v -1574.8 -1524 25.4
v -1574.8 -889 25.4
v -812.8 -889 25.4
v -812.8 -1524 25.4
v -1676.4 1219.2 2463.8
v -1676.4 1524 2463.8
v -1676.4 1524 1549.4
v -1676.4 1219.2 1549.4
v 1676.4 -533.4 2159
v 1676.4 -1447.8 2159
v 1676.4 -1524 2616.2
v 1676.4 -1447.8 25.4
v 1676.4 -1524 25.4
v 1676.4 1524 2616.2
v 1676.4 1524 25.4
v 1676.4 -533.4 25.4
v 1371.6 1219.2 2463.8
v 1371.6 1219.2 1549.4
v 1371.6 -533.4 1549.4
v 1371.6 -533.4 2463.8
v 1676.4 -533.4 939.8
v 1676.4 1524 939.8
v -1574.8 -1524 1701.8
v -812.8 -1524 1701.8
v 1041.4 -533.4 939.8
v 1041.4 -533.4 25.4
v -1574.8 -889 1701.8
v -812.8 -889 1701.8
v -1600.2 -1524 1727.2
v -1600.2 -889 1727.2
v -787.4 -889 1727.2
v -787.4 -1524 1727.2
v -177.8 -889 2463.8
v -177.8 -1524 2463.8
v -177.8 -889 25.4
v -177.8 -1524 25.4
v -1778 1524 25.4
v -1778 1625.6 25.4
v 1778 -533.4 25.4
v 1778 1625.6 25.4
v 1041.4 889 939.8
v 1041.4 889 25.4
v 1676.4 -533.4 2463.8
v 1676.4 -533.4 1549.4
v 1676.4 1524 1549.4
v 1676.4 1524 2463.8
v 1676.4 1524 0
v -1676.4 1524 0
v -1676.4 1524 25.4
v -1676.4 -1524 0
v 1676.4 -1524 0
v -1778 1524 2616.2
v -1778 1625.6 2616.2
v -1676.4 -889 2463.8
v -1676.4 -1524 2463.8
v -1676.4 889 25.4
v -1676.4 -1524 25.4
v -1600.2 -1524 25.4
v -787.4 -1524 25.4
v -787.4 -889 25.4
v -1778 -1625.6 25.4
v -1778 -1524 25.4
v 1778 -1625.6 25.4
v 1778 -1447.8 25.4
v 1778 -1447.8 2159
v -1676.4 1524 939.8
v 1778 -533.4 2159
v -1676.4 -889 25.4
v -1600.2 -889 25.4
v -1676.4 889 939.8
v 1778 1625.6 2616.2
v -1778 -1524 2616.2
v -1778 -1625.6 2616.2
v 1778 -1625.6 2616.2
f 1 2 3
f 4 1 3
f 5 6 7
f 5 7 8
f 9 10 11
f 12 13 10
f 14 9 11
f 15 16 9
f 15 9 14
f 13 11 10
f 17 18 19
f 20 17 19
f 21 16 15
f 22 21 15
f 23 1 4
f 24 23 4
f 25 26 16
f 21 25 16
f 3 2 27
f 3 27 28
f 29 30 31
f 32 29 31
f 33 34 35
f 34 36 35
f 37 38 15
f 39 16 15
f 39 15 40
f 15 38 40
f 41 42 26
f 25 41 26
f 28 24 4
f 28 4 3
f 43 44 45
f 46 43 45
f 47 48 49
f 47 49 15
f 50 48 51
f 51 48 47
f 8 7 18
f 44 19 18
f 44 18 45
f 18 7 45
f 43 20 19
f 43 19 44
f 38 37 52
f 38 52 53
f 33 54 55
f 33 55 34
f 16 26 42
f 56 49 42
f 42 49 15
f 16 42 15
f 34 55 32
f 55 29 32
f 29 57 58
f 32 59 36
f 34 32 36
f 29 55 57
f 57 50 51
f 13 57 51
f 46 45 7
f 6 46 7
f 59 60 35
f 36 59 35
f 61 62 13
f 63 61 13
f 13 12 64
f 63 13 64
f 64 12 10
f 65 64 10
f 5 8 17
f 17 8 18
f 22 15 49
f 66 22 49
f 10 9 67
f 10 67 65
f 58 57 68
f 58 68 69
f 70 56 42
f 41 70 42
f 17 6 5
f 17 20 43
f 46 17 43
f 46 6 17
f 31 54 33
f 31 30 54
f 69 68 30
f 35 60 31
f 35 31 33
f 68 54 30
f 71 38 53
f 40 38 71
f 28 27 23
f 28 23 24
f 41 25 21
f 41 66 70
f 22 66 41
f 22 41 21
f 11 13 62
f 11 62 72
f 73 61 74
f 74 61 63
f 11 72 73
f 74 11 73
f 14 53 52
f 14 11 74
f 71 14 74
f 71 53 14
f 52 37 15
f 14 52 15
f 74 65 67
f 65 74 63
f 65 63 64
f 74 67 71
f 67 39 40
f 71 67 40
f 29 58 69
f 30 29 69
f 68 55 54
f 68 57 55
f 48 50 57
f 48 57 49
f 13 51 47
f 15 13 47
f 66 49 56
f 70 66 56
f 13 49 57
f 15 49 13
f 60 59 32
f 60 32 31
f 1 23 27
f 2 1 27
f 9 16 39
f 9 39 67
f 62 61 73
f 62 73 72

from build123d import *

# Parameters (mm, degrees)
F0_W      = 3352.8
F0_H      = 3048
F1_DEPTH  = 25.4
F2_W      = 3556
F2_H      = 3251.2
F2_W_2    = 3352.8
F2_H_2    = 3048
F3_DEPTH  = 2590.8
F4_W      = 914.4
F4_H      = 2133.6
F5_DEPTH  = 101.6
F6_W      = 3048
F6_H      = 2590.8
F7_DEPTH  = 101.6
F9_DEPTH  = 914.4
F12_DEPTH = 914.4
F13_W     = 762
F13_H     = 635
F14_DEPTH = 1676.4
F15_W     = 609.6
F15_H     = 635
F16_DEPTH = 1701.8
F15_W_2   = 76.2
F17_W     = 1498.6
F17_H     = 635
F18_DEPTH = 736.6


with BuildPart() as f1:
    # F0 (on Top) → F1 (new body)
    with BuildSketch(Plane.XY):
        Rectangle(F0_W, F0_H)
    extrude(amount=F1_DEPTH)


with BuildPart() as f3:
    # F2 (on face) → F3 (new body)
    with BuildSketch(Plane.XY.offset(25.4)):
        Rectangle(F2_W, F2_H)
        Rectangle(F2_W_2, F2_H_2, mode=Mode.SUBTRACT)
    extrude(amount=F3_DEPTH)

    # F4 (on face) → F5 (cut, through all)
    with BuildSketch(Plane(origin=(1676.4, 0, 0), x_dir=(0, -1, 0), z_dir=(-1, 0, 0))):
        with Locations((990.6, 1092.2)):
            Rectangle(F4_W, F4_H)
    extrude(amount=-F5_DEPTH, mode=Mode.SUBTRACT)

    # F6 (on face) → F7 (cut, through all)
    with BuildSketch(Plane.YZ.offset(-1676.4)):
        with Locations((0, 1320.8)):
            Rectangle(F6_W, F6_H)
    extrude(amount=-F7_DEPTH, mode=Mode.SUBTRACT)


with BuildPart() as f9:
    # F8 (on face) → F9 (new body)
    with BuildSketch(Plane.XY.offset(25.4)):
        Polygon((1041.4, -533.4), (1676.4, -533.4), (1676.4, 1524), (-1676.4, 1524), (-1676.4, 889), (1041.4, 889), align=None)
    extrude(amount=F9_DEPTH)


with BuildPart() as f12:
    # F11 (on offset) → F12 (new body)
    with BuildSketch(Plane.XY.offset(1549.4)):
        Polygon((1676.4, 1524), (-1676.4, 1524), (-1676.4, 1219.2), (1371.6, 1219.2), (1371.6, -533.4), (1676.4, -533.4), align=None)
    extrude(amount=F12_DEPTH)


with BuildPart() as f14:
    # F13 (on face) → F14 (new body)
    with BuildSketch(Plane.XY.offset(25.4)):
        with Locations((-1193.8, -1206.5)):
            Rectangle(F13_W, F13_H)
    extrude(amount=F14_DEPTH)


with BuildPart() as f16:
    # F15 (on face) → F16 (new body)
    with BuildSketch(Plane.XY.offset(25.4)):
        with Locations((-482.6, -1206.5)):
            Rectangle(F15_W, F15_H)
    extrude(amount=F16_DEPTH)



with BuildPart() as f16b:
    # F15 (on face) → F16, piece 2 (new body)
    with BuildSketch(Plane.XY.offset(25.4)):
        with Locations((-1638.3, -1206.5)):
            Rectangle(F15_W_2, F15_H)
    extrude(amount=F16_DEPTH)


with BuildPart() as f16_1:
    add(f16.part)

    add(f16b.part)  # F18 merges F16b
    # F17 (on face) → F18 (join, through all)
    with BuildSketch(Plane.XY.offset(1727.2)):
        with Locations((-927.1, -1206.5)):
            Rectangle(F17_W, F17_H)
    extrude(amount=F18_DEPTH)


solid = Compound([f1.part, f3.part, f9.part, f12.part, f14.part, f16_1.part])
